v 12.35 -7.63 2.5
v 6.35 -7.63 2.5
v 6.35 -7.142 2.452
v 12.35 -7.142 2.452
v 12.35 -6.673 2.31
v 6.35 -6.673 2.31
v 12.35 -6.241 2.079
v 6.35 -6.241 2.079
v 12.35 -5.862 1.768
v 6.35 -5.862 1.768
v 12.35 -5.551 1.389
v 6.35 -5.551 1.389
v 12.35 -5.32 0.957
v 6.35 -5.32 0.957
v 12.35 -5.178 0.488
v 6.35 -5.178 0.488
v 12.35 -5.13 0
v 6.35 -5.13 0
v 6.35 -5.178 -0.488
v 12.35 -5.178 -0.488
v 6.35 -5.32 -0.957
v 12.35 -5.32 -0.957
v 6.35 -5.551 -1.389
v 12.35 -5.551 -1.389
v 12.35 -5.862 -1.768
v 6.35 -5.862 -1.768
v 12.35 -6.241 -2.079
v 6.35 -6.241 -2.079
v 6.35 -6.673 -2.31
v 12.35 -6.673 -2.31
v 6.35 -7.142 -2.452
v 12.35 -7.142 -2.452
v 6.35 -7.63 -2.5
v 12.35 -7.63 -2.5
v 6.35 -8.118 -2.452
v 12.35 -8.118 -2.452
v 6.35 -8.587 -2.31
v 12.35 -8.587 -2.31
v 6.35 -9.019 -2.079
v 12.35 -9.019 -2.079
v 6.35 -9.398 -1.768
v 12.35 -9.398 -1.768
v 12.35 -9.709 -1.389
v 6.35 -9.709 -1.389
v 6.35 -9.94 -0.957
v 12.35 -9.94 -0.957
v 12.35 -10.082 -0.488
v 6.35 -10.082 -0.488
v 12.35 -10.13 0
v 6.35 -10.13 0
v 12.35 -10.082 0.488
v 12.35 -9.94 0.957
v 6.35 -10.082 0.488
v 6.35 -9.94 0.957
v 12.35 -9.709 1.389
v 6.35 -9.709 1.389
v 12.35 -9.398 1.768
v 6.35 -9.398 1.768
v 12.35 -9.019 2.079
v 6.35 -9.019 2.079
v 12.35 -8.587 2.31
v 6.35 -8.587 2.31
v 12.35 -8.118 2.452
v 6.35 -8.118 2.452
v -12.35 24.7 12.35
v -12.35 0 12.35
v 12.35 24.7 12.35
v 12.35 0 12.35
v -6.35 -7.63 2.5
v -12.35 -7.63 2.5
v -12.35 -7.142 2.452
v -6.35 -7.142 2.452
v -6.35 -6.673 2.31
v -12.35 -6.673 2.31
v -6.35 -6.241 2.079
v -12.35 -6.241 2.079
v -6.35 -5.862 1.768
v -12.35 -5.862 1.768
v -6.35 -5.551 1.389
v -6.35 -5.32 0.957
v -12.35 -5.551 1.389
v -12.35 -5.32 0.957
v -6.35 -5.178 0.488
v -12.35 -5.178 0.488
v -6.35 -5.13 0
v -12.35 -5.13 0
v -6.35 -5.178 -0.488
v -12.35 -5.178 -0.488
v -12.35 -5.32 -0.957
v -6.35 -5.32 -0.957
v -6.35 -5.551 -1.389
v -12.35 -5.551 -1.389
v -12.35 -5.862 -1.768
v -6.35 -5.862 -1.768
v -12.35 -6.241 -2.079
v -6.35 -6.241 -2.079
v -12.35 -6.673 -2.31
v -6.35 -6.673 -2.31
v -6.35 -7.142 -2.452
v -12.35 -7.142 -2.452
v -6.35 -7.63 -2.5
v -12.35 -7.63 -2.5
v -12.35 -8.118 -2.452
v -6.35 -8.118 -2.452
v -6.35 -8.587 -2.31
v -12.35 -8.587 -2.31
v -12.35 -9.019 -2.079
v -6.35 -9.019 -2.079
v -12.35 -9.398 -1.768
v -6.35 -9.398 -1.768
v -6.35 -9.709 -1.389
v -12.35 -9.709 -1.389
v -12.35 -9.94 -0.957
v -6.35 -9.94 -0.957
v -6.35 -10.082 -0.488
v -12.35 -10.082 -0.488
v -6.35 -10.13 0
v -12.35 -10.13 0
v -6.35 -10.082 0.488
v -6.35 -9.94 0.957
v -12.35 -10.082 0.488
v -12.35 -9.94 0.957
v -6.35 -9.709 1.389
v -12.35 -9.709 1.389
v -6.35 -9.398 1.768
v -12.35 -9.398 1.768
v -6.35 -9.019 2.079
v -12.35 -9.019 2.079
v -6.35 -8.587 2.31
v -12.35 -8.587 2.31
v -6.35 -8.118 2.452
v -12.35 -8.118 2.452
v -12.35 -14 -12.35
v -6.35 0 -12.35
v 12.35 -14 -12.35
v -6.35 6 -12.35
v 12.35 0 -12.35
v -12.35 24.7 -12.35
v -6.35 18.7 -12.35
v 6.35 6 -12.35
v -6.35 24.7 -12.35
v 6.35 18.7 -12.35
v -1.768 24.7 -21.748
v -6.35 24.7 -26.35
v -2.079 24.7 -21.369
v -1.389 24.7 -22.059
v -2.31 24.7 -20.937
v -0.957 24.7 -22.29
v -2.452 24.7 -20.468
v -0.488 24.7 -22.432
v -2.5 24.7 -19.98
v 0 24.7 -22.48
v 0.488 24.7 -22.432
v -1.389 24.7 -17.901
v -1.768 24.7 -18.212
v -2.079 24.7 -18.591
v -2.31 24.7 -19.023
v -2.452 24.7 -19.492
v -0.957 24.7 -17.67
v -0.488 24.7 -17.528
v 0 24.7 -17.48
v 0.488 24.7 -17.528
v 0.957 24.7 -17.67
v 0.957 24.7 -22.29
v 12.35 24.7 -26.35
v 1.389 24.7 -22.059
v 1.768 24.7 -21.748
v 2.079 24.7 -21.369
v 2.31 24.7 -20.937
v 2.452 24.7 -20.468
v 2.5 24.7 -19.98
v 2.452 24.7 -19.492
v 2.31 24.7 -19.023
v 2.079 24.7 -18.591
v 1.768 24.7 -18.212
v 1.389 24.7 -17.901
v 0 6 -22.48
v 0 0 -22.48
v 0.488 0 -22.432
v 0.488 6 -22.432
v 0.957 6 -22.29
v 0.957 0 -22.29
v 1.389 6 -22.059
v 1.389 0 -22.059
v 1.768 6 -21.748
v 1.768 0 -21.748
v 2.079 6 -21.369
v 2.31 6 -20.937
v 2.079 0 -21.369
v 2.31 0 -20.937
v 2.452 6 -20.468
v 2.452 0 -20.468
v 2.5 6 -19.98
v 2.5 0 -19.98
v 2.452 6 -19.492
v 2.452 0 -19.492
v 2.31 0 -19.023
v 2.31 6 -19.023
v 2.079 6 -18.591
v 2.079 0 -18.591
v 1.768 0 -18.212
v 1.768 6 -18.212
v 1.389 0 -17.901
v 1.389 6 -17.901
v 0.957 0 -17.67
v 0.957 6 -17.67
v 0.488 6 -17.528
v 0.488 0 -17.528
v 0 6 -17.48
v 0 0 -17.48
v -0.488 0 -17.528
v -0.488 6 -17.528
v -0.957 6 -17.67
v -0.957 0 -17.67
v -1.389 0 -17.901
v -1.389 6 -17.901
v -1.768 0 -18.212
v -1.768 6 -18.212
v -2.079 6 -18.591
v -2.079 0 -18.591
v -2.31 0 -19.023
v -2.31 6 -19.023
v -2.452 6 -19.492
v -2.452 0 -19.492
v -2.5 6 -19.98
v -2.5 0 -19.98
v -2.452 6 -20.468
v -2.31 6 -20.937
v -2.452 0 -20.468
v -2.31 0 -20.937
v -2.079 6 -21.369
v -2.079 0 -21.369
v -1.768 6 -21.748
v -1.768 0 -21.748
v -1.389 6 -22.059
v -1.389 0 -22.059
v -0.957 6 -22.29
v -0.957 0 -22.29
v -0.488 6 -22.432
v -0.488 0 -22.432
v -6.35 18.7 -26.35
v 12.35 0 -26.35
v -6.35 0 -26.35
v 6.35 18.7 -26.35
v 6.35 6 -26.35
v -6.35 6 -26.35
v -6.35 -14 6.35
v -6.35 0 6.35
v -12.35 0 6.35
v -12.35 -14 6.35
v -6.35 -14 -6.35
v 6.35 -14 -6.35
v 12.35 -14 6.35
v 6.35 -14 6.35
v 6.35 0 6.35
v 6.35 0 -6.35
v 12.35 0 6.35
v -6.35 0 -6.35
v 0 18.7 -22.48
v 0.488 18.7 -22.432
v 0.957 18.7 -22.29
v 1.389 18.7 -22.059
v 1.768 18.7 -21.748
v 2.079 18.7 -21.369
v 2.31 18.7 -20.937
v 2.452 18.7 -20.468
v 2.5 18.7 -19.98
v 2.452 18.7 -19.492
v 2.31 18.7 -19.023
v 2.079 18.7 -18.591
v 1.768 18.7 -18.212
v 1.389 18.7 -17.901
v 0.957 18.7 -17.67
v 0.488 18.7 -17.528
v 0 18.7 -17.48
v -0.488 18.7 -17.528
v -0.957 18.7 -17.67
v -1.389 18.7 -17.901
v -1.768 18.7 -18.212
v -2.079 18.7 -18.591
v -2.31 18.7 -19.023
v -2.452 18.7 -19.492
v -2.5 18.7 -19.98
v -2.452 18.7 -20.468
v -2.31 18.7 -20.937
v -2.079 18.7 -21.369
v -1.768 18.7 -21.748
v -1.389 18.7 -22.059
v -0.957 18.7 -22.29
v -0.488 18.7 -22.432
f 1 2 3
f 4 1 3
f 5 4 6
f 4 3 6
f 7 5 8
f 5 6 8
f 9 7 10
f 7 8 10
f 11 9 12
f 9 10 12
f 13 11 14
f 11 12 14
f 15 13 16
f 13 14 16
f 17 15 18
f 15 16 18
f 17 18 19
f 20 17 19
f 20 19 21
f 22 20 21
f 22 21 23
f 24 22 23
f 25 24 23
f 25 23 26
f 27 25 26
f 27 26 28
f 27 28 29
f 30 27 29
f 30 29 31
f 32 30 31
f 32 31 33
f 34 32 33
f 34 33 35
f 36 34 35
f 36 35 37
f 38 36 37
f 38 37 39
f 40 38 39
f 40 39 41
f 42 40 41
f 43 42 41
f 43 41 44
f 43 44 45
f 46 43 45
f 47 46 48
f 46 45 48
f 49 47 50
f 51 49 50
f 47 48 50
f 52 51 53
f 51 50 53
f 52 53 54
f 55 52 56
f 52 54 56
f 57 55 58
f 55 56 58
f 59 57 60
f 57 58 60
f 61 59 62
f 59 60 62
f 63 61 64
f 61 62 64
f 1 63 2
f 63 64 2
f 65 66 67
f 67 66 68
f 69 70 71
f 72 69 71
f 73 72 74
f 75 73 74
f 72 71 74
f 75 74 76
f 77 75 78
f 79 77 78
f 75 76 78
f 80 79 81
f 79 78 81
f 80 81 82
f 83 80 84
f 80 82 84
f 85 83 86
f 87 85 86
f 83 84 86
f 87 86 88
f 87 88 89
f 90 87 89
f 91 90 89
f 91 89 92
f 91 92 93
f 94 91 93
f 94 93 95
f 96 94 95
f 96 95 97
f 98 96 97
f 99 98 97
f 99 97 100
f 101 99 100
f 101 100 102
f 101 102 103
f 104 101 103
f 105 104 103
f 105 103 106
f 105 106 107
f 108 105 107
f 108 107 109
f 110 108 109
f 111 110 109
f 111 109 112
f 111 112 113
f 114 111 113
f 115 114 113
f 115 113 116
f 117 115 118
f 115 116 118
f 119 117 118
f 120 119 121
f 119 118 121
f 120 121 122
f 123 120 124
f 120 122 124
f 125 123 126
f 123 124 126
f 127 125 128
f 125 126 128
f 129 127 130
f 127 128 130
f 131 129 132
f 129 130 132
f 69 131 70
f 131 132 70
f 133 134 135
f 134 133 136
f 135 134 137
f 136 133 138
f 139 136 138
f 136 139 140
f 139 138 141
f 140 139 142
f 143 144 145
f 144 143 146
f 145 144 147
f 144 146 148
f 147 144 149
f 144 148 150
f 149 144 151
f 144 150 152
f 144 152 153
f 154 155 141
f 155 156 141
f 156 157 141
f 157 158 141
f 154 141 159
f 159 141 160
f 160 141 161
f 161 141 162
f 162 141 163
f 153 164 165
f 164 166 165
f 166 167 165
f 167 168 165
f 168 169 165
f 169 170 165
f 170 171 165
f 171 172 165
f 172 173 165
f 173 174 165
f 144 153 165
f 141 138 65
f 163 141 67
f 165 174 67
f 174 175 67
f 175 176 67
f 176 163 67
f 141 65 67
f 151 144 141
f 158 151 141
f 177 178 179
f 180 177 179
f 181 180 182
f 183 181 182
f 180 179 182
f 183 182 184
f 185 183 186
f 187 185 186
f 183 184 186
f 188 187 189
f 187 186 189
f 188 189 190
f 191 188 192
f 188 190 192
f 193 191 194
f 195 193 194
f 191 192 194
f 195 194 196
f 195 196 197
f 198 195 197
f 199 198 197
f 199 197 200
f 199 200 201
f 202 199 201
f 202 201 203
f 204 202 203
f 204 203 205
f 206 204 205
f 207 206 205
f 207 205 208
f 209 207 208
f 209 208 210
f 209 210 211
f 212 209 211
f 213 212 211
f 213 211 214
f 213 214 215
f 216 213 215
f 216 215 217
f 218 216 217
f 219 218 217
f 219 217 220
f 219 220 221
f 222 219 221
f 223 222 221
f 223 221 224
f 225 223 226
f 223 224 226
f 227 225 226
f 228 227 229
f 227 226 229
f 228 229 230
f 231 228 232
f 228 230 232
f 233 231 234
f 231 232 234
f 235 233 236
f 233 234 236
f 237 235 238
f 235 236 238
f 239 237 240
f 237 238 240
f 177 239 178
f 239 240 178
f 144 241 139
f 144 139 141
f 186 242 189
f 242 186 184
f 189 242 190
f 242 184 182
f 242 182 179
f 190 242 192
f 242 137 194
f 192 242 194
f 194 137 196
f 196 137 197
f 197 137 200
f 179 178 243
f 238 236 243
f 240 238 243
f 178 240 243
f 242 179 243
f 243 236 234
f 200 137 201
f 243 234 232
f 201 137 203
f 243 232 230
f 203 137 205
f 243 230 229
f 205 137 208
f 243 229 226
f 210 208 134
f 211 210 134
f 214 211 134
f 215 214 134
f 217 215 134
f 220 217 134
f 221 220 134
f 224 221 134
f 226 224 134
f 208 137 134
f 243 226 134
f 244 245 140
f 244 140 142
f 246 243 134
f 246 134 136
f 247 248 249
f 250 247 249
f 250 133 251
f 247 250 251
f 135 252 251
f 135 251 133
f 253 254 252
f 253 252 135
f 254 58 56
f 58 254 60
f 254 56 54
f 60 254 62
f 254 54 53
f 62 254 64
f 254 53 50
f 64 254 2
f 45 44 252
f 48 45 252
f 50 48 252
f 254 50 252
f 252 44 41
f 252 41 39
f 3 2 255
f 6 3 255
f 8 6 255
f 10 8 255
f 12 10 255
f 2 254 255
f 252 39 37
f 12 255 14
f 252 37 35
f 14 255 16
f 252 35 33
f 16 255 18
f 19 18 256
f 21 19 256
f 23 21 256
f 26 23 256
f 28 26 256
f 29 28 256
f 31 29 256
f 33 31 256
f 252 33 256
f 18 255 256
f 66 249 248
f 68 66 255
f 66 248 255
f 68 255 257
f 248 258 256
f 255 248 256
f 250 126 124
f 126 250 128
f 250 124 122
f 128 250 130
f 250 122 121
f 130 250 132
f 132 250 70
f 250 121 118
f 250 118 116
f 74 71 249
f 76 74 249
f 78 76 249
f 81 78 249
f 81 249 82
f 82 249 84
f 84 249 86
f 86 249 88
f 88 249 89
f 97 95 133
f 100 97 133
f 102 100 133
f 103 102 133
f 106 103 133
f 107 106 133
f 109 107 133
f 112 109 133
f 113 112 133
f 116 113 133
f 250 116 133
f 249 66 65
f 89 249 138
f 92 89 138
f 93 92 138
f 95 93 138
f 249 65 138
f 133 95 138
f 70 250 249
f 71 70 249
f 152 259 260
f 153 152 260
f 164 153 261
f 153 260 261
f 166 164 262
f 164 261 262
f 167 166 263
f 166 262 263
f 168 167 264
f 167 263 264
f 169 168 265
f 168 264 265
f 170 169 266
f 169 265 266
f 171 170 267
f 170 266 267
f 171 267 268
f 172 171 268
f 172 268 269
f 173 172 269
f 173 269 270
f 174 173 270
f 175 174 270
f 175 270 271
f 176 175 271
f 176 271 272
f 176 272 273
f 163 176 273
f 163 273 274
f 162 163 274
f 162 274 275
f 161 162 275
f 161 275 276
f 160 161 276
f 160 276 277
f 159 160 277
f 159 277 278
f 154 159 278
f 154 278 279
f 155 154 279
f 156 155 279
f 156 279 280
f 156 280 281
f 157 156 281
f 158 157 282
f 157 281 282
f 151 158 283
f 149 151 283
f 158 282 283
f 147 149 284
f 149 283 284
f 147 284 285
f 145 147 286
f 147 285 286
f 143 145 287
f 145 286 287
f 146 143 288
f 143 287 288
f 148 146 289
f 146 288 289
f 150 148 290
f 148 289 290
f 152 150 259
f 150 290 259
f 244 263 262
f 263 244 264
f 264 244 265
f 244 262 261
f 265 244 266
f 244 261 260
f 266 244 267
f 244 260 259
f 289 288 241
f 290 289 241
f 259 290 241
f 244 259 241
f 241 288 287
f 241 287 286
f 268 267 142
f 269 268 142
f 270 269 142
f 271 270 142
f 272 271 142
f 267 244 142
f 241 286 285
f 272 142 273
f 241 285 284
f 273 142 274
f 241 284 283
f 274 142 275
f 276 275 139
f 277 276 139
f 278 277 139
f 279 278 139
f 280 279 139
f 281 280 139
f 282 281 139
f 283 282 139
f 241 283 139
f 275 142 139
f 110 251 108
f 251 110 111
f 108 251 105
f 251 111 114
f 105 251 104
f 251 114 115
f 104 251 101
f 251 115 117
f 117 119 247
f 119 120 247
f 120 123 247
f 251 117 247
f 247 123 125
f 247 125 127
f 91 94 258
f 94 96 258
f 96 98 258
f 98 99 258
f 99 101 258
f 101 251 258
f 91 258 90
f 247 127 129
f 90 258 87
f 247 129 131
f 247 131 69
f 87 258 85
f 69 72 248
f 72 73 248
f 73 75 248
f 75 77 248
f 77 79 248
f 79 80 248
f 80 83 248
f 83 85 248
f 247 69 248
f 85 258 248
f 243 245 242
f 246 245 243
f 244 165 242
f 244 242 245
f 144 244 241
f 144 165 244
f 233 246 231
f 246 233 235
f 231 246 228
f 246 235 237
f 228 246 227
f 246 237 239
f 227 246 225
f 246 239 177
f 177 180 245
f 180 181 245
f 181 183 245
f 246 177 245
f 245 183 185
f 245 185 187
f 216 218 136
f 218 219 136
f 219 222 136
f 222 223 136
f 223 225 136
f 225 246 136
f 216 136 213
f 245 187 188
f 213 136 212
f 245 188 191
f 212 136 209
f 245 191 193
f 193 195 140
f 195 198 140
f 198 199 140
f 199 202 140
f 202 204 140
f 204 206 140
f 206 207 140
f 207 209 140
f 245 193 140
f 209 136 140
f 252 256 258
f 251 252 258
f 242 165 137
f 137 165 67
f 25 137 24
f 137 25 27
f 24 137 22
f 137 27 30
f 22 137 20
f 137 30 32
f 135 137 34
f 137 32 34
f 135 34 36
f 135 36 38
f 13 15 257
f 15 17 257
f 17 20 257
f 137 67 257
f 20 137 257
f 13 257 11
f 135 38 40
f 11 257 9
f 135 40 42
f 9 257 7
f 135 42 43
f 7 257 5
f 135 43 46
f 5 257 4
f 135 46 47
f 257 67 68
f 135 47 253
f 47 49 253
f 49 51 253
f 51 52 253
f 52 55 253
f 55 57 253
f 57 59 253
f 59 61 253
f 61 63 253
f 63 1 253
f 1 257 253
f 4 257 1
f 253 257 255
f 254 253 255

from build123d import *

# Parameters (mm, degrees)
SKETCH_1_W          = 24.7
SKETCH_1_H          = 24.7
SKETCH_1_W_2        = 12.7
SKETCH_1_H_2        = 12.7
EXTRUDE_2_DEPTH     = 24.7
EXTRUDE_3_DEPTH     = 14
EXTRUDE_5_DEPTH     = 14
SKETCH_6_R          = 2.5
CUT_EXTRUDE_1_DEPTH = 39.169817919
SKETCH_7_R          = 2.5
CUT_EXTRUDE_2_DEPTH = 44.755028282


with BuildPart() as part:
    # 草图1 → 凸台-拉伸2 (new body)
    # profile 1 of 2: a face of its own
    with BuildSketch(Plane(origin=(0, 0, 0), x_dir=(1, 0, 0), z_dir=(0, 1, 0))):
        Rectangle(SKETCH_1_W, SKETCH_1_H)
        Rectangle(SKETCH_1_W_2, SKETCH_1_H_2, mode=Mode.SUBTRACT)
    # profile 2 of 2: a face of its own
    with BuildSketch(Plane(origin=(0, 0, 0), x_dir=(1, 0, 0), z_dir=(0, 1, 0))):
        Rectangle(SKETCH_1_W_2, SKETCH_1_H_2)
    extrude(amount=EXTRUDE_2_DEPTH)

    # 草图3 → 凸台-拉伸3 (add)
    with BuildSketch(Plane.XZ):
        Polygon((-6.35, -6.35), (-6.35, 6.35), (-12.35, 6.35), (-12.35, -12.35), (12.35, -12.35), (12.35, 6.35), (6.35, 6.35), (6.35, -6.35), align=None)
    extrude(amount=EXTRUDE_3_DEPTH)

    # 草图5 → 凸台-拉伸5 (add)
    with BuildSketch(Plane(origin=(0, 0, -12.35), x_dir=(-1, 0, 0), z_dir=(0, 0, -1))):
        Polygon((6.35, 24.7), (-12.35, 24.7), (-12.35, 0), (6.35, 0), (6.35, 6), (-6.35, 6), (-6.35, 18.7), (6.35, 18.7), align=None)
    extrude(amount=EXTRUDE_5_DEPTH)

    # 草图6 → 切除-拉伸1 (cut, through all)
    with BuildSketch(Plane.XZ):
        with Locations(Location((0, -19.98, 0), (0, 0, 270))):
            Circle(SKETCH_6_R)
    extrude(amount=-CUT_EXTRUDE_1_DEPTH, mode=Mode.SUBTRACT)

    # 草图7 → 切除-拉伸2 (cut, through all)
    with BuildSketch(Plane.ZY.offset(12.35)):
        with Locations((0, -7.63)):
            Circle(SKETCH_7_R)
    extrude(amount=-CUT_EXTRUDE_2_DEPTH, mode=Mode.SUBTRACT)


solid = part.part
